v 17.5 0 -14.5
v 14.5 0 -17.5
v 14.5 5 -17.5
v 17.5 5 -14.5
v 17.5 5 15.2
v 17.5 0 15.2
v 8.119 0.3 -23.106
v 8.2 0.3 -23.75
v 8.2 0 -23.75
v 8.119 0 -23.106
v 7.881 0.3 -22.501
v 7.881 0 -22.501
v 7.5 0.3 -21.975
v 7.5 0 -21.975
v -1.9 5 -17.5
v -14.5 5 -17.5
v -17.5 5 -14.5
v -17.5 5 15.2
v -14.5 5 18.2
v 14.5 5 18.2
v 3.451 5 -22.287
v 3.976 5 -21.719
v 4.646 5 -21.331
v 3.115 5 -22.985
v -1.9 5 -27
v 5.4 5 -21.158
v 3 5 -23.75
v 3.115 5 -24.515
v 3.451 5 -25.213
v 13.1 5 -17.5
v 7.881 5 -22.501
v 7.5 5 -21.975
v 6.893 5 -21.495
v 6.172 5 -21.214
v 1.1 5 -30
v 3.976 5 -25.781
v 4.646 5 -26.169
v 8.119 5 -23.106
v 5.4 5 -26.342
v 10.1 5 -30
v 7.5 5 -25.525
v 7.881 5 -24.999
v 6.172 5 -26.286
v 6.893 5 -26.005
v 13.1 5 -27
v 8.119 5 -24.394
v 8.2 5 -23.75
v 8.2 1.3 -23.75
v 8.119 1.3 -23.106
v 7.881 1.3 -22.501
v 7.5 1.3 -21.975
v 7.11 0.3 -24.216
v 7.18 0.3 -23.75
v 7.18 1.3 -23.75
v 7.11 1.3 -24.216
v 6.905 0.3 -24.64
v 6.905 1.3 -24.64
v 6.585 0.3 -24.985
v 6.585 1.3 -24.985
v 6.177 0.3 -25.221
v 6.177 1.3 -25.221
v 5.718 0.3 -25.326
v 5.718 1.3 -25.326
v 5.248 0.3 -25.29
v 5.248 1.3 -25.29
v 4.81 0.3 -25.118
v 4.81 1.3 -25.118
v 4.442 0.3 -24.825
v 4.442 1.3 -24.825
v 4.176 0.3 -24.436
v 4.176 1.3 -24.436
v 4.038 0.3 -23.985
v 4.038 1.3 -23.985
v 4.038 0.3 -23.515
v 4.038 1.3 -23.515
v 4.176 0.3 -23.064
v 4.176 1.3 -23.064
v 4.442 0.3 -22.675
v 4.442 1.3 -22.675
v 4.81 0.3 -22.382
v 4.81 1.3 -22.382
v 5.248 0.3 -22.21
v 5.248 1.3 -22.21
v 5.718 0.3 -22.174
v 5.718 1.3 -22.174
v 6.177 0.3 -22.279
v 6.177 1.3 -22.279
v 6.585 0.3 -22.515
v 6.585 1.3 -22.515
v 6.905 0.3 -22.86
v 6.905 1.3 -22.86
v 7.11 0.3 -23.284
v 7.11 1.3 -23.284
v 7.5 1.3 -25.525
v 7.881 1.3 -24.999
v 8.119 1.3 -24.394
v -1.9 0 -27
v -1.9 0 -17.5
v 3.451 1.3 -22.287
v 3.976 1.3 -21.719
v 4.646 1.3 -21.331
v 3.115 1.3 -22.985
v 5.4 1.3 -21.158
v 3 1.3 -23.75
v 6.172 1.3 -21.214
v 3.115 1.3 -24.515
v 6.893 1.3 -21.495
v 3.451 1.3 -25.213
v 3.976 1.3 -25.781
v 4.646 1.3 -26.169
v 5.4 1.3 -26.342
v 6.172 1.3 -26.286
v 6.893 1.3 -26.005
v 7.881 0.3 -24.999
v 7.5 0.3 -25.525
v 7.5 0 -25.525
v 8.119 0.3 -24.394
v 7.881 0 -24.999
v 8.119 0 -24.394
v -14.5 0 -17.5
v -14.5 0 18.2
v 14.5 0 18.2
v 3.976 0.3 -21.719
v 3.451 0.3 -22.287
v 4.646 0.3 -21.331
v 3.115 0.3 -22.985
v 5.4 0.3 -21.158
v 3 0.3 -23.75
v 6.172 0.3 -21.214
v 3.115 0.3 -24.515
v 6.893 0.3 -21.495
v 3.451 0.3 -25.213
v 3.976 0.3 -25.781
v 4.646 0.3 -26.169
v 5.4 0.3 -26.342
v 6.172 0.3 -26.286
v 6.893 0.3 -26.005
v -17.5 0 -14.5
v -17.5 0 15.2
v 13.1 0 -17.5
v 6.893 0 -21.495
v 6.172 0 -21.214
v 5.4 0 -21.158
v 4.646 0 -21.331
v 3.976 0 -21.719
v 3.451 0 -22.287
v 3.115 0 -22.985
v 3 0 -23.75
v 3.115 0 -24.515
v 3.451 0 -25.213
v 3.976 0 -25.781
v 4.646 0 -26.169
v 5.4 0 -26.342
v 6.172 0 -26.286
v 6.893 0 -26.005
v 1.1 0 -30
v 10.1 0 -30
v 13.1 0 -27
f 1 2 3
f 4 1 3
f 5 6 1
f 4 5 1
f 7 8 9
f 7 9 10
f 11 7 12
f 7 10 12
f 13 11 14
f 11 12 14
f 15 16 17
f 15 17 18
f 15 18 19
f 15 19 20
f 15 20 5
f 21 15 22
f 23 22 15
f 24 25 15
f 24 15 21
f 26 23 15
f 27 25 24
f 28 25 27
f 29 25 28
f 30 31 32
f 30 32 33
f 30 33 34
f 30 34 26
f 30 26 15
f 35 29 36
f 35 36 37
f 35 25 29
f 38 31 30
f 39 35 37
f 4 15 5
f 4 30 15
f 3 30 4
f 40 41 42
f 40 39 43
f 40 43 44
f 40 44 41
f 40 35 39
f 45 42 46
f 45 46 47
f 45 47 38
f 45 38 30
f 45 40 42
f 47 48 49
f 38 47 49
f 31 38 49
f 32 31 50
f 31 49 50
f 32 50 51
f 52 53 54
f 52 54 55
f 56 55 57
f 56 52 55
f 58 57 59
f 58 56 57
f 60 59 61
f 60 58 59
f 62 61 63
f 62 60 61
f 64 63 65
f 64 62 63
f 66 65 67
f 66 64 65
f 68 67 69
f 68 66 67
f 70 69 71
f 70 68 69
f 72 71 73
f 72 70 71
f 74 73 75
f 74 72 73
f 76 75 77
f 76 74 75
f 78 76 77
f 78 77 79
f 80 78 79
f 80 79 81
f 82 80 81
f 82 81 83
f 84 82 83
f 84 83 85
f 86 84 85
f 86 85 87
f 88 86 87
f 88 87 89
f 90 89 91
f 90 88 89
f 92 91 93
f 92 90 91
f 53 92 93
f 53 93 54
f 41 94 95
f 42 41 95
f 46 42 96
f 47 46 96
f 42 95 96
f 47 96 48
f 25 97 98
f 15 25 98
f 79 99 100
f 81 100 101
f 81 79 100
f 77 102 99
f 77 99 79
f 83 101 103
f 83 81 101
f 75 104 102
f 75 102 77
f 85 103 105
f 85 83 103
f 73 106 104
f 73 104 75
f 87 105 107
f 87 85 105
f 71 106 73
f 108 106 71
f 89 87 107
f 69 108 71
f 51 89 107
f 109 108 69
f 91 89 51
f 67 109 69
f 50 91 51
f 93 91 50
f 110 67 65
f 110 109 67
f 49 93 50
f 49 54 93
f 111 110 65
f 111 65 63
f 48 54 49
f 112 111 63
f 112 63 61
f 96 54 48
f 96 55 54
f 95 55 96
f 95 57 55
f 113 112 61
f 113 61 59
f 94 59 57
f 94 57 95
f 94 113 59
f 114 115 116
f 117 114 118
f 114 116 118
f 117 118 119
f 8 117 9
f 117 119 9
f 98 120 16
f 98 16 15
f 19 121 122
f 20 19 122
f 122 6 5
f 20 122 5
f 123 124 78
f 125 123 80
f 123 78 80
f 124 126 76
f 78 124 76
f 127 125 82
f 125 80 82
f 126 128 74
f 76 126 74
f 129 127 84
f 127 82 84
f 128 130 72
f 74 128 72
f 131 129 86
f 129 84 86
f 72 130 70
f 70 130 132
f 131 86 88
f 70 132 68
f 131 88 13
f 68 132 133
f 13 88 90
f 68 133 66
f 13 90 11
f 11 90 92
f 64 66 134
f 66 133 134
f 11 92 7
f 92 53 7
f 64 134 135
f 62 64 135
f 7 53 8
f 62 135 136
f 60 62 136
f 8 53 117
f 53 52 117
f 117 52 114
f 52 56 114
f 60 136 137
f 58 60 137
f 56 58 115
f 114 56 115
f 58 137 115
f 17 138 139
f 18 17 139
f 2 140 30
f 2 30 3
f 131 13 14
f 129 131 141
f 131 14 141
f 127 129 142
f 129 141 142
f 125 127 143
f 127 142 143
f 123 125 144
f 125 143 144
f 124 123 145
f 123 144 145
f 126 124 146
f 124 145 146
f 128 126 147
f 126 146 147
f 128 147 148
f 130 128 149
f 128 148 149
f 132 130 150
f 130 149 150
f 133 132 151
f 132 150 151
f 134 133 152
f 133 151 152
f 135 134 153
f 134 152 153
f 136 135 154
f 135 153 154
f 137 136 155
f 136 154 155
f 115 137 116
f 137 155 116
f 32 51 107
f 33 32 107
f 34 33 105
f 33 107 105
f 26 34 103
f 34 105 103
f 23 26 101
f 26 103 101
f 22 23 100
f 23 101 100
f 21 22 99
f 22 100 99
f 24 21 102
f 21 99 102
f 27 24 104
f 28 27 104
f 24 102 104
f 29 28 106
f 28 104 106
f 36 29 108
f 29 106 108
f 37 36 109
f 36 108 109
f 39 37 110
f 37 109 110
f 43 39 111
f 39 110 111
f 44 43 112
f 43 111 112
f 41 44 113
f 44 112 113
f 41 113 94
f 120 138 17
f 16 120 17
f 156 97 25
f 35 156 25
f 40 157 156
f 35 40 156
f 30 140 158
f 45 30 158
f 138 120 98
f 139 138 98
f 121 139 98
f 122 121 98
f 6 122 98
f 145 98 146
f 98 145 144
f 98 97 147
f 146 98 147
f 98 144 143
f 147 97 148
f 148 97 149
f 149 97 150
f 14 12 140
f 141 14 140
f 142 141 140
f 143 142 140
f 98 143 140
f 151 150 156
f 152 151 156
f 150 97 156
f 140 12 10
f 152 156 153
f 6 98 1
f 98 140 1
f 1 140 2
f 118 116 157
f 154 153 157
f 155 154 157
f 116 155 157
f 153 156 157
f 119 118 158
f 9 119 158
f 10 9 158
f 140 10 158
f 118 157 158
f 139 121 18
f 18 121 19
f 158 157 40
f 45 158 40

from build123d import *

# Parameters (mm, degrees)
SKETCH1_W           = 35
SKETCH1_H           = 0.7
SKETCH1_H_2         = 35
BOSS_EXTRUDE1_DEPTH = 5
CHAMFER1_SIZE       = 3
SKETCH4_R           = 2.6
SKETCH4_R_2         = 1.58
BOSS_EXTRUDE2_DEPTH = 1


with BuildPart() as part:
    # Sketch1 → Boss-Extrude1 (new body)
    with BuildSketch(Plane(origin=(0, 0, 0), x_dir=(1, 0, 0), z_dir=(0, 1, 0))):
        with BuildLine():
            Line((7.5, 17.5), (13.1, 17.5))
            Line((13.1, 17.5), (13.1, 30))
            Line((13.1, 30), (7.5, 30))
            Line((7.5, 30), (7.5, 25.524823935))
            ThreePointArc((7.5, 25.524823935), (8.018677324, 24.703939201), (8.2, 23.75))
            ThreePointArc((8.2, 23.75), (8.018677324, 22.796060799), (7.5, 21.975176065))
            Line((7.5, 21.975176065), (7.5, 17.5))
        make_face()
        with BuildLine():
            Line((-1.9, 30), (-1.9, 17.5))
            Line((-1.9, 17.5), (7.5, 17.5))
            Line((7.5, 17.5), (7.5, 21.975176065))
            ThreePointArc((7.5, 21.975176065), (3, 23.75), (7.5, 25.524823935))
            Line((7.5, 25.524823935), (7.5, 30))
            Line((7.5, 30), (-1.9, 30))
        make_face()
        with Locations((0, -17.85)):
            Rectangle(SKETCH1_W, SKETCH1_H)
        Rectangle(SKETCH1_W, SKETCH1_H_2)
    extrude(amount=BOSS_EXTRUDE1_DEPTH)

    # Chamfer1
    chamfer1_edges = [part.edges().sort_by_distance(p)[0] for p in [
        (-1.9, 2.5, -30),
        (13.1, 2.5, -30),
        (17.5, 2.5, -17.5),
        (17.5, 2.5, 18.2),
        (-17.5, 2.5, 18.2),
        (-17.5, 2.5, -17.5),
    ]]
    chamfer(chamfer1_edges, length=CHAMFER1_SIZE)

    # Sketch4 → Boss-Extrude2 (add)
    with BuildSketch(Plane(origin=(0, 0.3, 0), x_dir=(1, 0, 0), z_dir=(0, 1, 0))):
        with Locations((5.6, 23.75)):
            Circle(SKETCH4_R)
        with Locations((5.6, 23.75)):
            Circle(SKETCH4_R_2, mode=Mode.SUBTRACT)
    extrude(amount=BOSS_EXTRUDE2_DEPTH)


solid = part.part
